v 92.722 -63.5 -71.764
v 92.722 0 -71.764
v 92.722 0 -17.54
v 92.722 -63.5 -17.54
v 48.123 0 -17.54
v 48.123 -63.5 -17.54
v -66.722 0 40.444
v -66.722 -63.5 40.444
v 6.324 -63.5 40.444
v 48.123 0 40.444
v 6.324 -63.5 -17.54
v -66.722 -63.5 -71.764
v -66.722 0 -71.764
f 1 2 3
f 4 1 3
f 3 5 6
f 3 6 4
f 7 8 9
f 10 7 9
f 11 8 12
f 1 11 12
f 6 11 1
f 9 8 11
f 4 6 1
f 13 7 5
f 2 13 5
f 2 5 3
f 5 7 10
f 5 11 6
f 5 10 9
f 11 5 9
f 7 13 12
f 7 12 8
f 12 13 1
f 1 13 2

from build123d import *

# Parameters (mm, degrees)
F0_W     = 159.44358
F0_H     = 118.819759
F1_DEPTH = 63.5
F2_W     = 44.598654
F2_H     = 64.595787
F3_DEPTH = 66.802
F5_DEPTH = 64.595786
F6_W     = 126.061455
F6_H     = 6.612033
F7_DEPTH = 70.866


with BuildPart() as f1:
    # F0 (on Front) → F1 (new body)
    with BuildSketch(Plane.XZ):
        with Locations((13.00003, -12.35427)):
            Rectangle(F0_W, F0_H)
    extrude(amount=F1_DEPTH)

    # F2 (on face) → F3 (cut)
    with BuildSketch(Plane.XZ.offset(63.5)):
        with Locations((70.422493, 14.757716)):
            Rectangle(F2_W, F2_H)
    extrude(amount=-F3_DEPTH, mode=Mode.SUBTRACT)

    # F4 (on face) → F5 (cut, through all)
    with BuildSketch(Plane.XY.offset(47.05561)):
        Polygon((48.123166, -63.5), (48.123166, 0), (6.32387, -63.5), align=None)
    extrude(amount=-F5_DEPTH, mode=Mode.SUBTRACT)

    # F6 (on face) → F7 (cut)
    with BuildSketch(Plane.XZ.offset(63.5)):
        with Locations((-3.691033, 43.749593)):
            Rectangle(F6_W, F6_H)
    extrude(amount=-F7_DEPTH, mode=Mode.SUBTRACT)


solid = f1.part
